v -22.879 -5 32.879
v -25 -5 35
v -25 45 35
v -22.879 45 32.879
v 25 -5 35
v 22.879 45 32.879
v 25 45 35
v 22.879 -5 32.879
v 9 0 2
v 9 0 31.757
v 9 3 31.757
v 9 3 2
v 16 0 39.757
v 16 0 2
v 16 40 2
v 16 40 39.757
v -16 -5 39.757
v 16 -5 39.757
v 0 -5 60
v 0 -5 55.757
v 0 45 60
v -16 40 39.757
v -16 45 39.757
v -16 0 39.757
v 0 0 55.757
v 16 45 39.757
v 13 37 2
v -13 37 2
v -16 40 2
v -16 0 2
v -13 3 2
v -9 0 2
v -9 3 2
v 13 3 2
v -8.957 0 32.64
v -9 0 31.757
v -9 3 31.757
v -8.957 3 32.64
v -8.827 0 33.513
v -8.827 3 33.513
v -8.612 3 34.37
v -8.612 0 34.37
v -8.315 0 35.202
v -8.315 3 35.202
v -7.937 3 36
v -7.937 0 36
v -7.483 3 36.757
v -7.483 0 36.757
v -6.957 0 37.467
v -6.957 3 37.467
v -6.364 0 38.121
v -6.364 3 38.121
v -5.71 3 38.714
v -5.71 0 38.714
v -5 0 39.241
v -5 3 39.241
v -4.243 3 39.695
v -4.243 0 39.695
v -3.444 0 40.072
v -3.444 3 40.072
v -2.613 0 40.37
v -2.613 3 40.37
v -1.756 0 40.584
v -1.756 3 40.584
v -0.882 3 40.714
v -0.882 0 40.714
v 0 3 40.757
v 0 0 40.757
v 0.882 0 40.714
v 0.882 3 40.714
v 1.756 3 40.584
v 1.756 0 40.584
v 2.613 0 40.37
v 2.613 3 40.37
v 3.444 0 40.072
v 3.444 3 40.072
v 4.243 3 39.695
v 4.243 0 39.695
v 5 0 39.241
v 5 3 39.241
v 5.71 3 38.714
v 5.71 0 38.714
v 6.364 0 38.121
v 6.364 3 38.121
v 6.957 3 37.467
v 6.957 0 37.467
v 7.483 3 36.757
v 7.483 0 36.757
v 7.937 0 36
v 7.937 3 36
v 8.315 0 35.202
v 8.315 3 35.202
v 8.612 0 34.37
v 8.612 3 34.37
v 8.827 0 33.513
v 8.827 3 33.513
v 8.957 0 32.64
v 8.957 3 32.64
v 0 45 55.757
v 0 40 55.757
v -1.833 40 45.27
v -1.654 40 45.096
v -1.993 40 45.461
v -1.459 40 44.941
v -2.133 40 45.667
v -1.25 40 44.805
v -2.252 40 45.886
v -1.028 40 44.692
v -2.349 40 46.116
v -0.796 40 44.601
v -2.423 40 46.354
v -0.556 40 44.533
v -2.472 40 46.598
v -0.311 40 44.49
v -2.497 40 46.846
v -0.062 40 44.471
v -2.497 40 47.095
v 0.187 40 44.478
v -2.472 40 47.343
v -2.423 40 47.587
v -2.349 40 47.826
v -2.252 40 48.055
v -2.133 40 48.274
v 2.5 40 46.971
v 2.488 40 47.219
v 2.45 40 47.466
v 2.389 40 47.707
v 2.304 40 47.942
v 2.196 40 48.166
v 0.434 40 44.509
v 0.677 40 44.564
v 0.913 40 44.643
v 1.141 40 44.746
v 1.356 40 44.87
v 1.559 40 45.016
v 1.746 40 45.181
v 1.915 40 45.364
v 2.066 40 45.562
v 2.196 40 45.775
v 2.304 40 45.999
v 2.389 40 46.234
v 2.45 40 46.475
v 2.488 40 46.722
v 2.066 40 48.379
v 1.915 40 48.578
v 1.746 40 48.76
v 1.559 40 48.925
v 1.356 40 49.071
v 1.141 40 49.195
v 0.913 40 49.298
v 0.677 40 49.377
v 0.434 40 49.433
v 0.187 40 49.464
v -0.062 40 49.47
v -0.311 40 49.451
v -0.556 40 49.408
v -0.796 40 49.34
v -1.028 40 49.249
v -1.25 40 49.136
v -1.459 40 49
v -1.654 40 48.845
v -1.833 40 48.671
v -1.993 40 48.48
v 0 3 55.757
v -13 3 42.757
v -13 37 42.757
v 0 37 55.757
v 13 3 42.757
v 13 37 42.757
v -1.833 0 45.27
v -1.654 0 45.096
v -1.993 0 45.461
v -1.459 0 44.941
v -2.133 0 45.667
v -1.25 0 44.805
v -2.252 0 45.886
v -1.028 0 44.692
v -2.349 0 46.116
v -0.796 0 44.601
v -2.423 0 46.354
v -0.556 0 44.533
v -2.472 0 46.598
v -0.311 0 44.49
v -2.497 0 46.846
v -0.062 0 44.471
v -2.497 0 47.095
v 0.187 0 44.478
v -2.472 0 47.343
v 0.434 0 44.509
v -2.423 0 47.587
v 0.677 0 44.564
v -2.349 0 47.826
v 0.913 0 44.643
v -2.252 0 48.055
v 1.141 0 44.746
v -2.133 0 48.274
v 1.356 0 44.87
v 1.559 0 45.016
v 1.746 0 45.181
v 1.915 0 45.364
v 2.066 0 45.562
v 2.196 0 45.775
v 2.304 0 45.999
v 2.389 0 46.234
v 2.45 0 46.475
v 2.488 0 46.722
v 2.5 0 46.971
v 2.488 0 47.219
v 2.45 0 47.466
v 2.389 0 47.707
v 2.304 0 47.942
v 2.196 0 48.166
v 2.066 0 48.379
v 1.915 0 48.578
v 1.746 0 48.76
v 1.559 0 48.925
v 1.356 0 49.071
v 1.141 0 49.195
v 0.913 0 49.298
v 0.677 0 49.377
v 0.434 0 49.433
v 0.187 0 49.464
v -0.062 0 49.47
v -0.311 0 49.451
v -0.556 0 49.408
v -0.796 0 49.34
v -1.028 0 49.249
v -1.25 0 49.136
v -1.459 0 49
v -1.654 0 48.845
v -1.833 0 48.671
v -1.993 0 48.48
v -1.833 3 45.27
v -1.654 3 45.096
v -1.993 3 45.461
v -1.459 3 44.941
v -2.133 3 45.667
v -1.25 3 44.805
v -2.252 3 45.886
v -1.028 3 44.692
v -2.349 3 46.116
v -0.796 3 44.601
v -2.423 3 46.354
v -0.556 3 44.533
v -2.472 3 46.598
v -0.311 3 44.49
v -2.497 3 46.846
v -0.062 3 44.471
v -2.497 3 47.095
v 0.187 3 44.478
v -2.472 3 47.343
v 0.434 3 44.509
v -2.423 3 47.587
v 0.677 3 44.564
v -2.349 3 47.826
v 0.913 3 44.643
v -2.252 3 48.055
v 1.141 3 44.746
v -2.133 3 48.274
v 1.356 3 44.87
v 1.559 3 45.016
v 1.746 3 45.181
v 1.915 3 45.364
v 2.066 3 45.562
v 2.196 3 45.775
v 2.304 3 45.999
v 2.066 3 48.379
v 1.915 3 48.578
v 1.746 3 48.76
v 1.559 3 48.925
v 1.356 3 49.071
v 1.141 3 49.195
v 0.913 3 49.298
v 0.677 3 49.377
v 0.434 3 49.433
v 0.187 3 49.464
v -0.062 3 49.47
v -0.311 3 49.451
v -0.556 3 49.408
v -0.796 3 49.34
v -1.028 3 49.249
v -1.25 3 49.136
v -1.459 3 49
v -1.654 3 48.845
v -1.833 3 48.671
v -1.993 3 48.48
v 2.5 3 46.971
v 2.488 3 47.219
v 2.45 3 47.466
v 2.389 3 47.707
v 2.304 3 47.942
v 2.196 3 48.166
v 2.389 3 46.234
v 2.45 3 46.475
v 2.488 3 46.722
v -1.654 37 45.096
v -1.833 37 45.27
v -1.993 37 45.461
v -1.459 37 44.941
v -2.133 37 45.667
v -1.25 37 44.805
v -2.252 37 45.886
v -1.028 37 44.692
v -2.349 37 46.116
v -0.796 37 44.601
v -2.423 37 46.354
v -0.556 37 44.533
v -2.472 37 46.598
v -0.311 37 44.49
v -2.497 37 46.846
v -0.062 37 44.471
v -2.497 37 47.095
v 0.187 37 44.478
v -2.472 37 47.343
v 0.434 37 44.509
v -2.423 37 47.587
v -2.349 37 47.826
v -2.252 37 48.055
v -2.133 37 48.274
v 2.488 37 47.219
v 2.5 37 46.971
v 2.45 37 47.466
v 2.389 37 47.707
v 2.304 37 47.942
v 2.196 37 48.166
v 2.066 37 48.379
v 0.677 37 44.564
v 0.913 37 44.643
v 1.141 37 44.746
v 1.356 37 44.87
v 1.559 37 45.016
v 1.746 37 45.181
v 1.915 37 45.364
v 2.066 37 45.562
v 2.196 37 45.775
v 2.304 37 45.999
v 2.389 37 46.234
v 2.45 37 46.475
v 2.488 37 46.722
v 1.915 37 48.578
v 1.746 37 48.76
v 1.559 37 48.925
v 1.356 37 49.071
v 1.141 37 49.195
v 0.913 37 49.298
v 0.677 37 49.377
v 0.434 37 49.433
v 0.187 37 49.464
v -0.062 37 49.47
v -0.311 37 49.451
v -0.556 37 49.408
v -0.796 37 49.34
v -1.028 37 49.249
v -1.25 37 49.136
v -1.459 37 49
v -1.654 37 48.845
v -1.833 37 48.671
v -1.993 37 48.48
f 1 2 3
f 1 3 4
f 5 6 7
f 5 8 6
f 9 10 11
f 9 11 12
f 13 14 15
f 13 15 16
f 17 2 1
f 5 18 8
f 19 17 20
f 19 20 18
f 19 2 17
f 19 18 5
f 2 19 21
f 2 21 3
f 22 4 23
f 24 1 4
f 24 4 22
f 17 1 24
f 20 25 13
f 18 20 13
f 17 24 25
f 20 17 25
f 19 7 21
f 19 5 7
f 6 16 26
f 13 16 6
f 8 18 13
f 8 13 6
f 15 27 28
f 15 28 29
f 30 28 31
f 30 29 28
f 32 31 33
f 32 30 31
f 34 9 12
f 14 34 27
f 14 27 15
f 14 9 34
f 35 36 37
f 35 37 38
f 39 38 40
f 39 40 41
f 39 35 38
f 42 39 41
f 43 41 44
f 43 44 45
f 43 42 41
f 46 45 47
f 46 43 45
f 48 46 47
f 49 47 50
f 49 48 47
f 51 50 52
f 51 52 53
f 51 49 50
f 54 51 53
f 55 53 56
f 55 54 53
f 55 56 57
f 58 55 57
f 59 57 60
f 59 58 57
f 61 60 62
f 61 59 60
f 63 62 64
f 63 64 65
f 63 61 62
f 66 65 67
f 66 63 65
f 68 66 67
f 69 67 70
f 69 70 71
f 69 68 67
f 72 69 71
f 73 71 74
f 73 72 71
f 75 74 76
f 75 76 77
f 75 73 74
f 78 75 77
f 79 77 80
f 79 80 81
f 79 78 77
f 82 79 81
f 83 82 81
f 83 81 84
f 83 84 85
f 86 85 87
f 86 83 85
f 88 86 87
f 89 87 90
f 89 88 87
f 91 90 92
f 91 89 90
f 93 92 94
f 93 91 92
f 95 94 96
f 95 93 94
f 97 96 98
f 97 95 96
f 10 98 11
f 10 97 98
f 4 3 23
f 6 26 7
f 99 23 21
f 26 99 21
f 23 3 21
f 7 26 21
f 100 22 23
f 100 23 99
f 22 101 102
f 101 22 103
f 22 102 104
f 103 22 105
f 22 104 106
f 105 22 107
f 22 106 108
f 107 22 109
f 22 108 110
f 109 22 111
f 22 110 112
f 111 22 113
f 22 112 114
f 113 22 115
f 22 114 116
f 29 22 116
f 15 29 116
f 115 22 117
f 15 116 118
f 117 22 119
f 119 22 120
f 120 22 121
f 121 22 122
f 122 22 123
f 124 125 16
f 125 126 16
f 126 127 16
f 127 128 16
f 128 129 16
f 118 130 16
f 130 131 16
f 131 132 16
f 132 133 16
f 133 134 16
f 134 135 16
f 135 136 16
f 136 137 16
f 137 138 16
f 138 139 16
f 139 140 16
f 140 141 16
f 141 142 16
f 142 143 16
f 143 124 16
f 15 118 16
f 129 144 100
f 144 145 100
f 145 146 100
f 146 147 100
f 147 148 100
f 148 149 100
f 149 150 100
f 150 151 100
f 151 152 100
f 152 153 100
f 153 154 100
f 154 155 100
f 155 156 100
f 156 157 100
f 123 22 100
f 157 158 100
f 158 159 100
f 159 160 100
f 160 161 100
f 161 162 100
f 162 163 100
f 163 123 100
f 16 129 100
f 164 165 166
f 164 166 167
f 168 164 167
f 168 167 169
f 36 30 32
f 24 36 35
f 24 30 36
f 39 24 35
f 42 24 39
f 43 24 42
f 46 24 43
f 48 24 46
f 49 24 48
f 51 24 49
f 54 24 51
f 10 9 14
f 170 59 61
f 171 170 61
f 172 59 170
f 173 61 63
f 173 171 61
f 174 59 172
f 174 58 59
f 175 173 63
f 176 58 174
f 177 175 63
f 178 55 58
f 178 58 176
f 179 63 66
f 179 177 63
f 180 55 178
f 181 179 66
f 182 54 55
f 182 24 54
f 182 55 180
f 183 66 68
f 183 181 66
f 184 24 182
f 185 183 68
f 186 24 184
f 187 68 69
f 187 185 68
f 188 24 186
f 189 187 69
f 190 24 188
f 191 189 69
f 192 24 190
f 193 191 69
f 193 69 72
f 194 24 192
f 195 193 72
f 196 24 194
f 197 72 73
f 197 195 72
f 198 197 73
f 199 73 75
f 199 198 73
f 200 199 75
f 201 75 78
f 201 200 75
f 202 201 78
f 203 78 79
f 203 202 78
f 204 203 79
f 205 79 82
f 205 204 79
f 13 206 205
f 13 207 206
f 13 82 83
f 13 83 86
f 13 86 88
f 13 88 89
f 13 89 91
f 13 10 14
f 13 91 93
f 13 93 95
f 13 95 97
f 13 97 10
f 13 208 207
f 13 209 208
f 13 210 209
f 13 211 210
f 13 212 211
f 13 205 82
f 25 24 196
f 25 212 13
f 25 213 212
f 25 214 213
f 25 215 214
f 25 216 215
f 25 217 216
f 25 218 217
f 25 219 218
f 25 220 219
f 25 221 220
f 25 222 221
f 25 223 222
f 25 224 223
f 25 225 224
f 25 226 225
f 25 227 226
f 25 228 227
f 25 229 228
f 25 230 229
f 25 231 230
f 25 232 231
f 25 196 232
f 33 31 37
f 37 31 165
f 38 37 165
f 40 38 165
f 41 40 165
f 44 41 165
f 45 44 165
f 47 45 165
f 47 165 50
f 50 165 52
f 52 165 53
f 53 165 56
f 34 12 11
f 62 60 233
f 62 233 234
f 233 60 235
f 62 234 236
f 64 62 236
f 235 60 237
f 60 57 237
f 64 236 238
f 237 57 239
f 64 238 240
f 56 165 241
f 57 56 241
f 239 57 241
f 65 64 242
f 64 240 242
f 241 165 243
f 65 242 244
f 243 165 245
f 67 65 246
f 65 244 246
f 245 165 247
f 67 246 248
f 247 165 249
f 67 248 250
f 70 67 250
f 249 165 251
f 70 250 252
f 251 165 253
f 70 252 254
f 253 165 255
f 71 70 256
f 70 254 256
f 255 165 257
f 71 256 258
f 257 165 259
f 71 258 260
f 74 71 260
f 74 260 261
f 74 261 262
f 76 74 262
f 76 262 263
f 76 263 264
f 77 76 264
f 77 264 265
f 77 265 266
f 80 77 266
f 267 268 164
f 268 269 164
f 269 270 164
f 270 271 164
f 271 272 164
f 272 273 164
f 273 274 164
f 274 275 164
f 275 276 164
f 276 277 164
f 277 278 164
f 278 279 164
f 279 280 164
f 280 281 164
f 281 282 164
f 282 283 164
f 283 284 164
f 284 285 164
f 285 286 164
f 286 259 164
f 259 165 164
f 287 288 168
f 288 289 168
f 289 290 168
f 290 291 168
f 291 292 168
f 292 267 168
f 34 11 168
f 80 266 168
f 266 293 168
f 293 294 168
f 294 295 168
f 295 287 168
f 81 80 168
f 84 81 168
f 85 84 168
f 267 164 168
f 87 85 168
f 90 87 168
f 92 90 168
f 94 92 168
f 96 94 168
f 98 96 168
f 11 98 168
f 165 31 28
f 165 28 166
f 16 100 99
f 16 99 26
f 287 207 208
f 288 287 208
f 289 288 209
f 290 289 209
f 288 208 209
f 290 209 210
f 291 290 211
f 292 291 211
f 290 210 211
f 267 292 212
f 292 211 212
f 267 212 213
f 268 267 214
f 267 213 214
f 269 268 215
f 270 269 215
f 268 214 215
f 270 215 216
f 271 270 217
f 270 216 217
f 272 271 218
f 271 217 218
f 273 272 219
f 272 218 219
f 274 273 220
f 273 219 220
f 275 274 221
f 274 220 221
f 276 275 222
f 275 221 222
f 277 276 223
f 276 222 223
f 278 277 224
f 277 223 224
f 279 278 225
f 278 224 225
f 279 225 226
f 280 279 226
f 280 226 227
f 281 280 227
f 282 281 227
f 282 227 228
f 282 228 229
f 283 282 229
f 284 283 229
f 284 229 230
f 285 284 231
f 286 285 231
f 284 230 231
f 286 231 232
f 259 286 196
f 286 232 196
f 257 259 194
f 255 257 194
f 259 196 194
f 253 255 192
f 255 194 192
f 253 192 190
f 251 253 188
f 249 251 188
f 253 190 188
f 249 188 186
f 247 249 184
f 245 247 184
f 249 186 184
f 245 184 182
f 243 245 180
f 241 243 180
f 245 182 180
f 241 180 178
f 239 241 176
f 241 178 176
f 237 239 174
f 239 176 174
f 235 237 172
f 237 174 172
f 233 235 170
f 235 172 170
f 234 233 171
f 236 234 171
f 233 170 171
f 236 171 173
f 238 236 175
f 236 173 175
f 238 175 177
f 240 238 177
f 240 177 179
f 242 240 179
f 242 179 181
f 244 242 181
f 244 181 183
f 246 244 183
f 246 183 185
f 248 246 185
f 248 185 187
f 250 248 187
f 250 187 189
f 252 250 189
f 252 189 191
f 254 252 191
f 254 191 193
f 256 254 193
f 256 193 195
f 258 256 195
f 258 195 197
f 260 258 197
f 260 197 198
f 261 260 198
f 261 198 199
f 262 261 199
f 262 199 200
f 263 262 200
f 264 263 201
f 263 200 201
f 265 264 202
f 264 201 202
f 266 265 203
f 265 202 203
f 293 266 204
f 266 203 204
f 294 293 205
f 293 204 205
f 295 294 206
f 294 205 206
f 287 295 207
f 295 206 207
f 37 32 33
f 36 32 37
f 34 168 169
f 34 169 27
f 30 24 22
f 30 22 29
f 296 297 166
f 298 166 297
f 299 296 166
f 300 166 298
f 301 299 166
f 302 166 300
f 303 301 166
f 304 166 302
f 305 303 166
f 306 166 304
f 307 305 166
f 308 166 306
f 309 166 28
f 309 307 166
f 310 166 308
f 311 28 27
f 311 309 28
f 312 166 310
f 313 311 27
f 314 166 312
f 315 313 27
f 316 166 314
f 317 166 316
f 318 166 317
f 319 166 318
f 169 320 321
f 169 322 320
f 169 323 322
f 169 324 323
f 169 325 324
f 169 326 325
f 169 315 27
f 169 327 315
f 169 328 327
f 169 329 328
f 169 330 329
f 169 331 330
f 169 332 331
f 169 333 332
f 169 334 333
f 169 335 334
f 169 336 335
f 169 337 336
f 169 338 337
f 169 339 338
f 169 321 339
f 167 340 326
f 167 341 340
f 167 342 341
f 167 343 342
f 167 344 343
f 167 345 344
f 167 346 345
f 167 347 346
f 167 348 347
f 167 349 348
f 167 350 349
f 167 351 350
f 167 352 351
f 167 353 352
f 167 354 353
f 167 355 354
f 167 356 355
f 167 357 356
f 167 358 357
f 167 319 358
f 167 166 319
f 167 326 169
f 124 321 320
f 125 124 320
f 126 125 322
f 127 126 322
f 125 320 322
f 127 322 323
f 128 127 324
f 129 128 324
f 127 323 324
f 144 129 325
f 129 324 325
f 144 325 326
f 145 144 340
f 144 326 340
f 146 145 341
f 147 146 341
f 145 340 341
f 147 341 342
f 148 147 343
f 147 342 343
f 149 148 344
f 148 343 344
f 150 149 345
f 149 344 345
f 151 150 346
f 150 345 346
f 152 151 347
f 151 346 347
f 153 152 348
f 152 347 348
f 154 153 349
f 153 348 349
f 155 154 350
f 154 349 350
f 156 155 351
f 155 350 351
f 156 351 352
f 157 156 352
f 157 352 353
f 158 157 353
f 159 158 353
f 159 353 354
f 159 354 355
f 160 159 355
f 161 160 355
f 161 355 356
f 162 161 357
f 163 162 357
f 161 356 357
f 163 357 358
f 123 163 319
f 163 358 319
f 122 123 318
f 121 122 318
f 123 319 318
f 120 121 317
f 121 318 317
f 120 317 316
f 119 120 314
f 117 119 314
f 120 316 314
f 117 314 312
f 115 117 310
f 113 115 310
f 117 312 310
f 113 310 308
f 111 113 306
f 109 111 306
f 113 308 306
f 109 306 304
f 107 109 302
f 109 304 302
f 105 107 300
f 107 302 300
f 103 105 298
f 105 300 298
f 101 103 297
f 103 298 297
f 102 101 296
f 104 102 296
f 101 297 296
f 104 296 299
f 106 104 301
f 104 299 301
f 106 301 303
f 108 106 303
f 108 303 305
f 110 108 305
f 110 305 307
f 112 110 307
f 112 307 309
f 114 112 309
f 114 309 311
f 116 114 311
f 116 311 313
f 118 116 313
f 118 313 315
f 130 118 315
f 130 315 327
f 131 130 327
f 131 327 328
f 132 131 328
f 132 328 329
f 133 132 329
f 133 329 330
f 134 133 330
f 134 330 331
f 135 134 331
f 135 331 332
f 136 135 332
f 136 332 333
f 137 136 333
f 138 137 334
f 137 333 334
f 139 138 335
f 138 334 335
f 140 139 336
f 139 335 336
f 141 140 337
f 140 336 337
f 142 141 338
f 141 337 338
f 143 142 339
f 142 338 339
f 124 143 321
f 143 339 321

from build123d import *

# Parameters (mm, degrees)
F0_R          = 2.5
F1_DEPTH      = 3
F2_DEPTH      = 5
F2_DEPTH_BACK = 45
F3_DEPTH      = 40
F4_START      = -37
F4_DEPTH      = 3


with BuildPart() as f1:
    # F0 (on Front) → F1 (new body)
    with BuildSketch(Plane.XZ):
        Polygon((-13, 42.7573593129), (-16, 39.7573593129), (-16, 2), (-13, 2), align=None)
        with BuildLine():
            Line((13, 2), (13, 42.7573593129))
            Line((13, 42.7573593129), (0, 55.7573593129))
            Line((0, 55.7573593129), (-13, 42.7573593129))
            Line((-13, 42.7573593129), (-13, 2))
            Line((-13, 2), (-9, 2))
            Line((-9, 2), (-9, 31.7573593129))
            ThreePointArc((-9, 31.7573593129), (0, 40.7573593129), (9, 31.7573593129))
            Line((9, 31.7573593129), (9, 2))
            Line((9, 2), (13, 2))
        make_face()
        with Locations((0, 46.9705627485)):
            Circle(F0_R, mode=Mode.SUBTRACT)
        Polygon((16, 2), (16, 39.7573593129), (13, 42.7573593129), (13, 2), align=None)
    extrude(amount=-F1_DEPTH)

    # F0 (on Front) → F2 (join, two sides)
    with BuildSketch(Plane.XZ) as f2_sk:
        Polygon((25, 35), (0, 60), (-25, 35), (-22.8786796564, 32.8786796564), (-16, 39.7573593129), (-13, 42.7573593129), (0, 55.7573593129), (13, 42.7573593129), (16, 39.7573593129), (22.8786796564, 32.8786796564), align=None)
    extrude(amount=F2_DEPTH)
    extrude(f2_sk.sketch, amount=-F2_DEPTH_BACK)

    # F0 (on Front) → F3 (join)
    with BuildSketch(Plane.XZ):
        Polygon((-13, 42.7573593129), (-16, 39.7573593129), (-16, 2), (-13, 2), align=None)
        Polygon((16, 2), (16, 39.7573593129), (13, 42.7573593129), (13, 2), align=None)
    extrude(amount=-F3_DEPTH)

    # F0 (on Front) → F4 (join)
    with BuildSketch(Plane.XZ.offset(F4_START)):
        with BuildLine():
            Line((13, 2), (13, 42.7573593129))
            Line((13, 42.7573593129), (0, 55.7573593129))
            Line((0, 55.7573593129), (-13, 42.7573593129))
            Line((-13, 42.7573593129), (-13, 2))
            Line((-13, 2), (-9, 2))
            Line((-9, 2), (-9, 31.7573593129))
            ThreePointArc((-9, 31.7573593129), (0, 40.7573593129), (9, 31.7573593129))
            Line((9, 31.7573593129), (9, 2))
            Line((9, 2), (13, 2))
        make_face()
        with Locations((0, 46.9705627485)):
            Circle(F0_R, mode=Mode.SUBTRACT)
        with BuildLine():
            Line((-9, 2), (9, 2))
            Line((9, 2), (9, 31.7573593129))
            ThreePointArc((9, 31.7573593129), (0, 40.7573593129), (-9, 31.7573593129))
            Line((-9, 31.7573593129), (-9, 2))
        make_face()
    extrude(amount=-F4_DEPTH)


solid = f1.part
